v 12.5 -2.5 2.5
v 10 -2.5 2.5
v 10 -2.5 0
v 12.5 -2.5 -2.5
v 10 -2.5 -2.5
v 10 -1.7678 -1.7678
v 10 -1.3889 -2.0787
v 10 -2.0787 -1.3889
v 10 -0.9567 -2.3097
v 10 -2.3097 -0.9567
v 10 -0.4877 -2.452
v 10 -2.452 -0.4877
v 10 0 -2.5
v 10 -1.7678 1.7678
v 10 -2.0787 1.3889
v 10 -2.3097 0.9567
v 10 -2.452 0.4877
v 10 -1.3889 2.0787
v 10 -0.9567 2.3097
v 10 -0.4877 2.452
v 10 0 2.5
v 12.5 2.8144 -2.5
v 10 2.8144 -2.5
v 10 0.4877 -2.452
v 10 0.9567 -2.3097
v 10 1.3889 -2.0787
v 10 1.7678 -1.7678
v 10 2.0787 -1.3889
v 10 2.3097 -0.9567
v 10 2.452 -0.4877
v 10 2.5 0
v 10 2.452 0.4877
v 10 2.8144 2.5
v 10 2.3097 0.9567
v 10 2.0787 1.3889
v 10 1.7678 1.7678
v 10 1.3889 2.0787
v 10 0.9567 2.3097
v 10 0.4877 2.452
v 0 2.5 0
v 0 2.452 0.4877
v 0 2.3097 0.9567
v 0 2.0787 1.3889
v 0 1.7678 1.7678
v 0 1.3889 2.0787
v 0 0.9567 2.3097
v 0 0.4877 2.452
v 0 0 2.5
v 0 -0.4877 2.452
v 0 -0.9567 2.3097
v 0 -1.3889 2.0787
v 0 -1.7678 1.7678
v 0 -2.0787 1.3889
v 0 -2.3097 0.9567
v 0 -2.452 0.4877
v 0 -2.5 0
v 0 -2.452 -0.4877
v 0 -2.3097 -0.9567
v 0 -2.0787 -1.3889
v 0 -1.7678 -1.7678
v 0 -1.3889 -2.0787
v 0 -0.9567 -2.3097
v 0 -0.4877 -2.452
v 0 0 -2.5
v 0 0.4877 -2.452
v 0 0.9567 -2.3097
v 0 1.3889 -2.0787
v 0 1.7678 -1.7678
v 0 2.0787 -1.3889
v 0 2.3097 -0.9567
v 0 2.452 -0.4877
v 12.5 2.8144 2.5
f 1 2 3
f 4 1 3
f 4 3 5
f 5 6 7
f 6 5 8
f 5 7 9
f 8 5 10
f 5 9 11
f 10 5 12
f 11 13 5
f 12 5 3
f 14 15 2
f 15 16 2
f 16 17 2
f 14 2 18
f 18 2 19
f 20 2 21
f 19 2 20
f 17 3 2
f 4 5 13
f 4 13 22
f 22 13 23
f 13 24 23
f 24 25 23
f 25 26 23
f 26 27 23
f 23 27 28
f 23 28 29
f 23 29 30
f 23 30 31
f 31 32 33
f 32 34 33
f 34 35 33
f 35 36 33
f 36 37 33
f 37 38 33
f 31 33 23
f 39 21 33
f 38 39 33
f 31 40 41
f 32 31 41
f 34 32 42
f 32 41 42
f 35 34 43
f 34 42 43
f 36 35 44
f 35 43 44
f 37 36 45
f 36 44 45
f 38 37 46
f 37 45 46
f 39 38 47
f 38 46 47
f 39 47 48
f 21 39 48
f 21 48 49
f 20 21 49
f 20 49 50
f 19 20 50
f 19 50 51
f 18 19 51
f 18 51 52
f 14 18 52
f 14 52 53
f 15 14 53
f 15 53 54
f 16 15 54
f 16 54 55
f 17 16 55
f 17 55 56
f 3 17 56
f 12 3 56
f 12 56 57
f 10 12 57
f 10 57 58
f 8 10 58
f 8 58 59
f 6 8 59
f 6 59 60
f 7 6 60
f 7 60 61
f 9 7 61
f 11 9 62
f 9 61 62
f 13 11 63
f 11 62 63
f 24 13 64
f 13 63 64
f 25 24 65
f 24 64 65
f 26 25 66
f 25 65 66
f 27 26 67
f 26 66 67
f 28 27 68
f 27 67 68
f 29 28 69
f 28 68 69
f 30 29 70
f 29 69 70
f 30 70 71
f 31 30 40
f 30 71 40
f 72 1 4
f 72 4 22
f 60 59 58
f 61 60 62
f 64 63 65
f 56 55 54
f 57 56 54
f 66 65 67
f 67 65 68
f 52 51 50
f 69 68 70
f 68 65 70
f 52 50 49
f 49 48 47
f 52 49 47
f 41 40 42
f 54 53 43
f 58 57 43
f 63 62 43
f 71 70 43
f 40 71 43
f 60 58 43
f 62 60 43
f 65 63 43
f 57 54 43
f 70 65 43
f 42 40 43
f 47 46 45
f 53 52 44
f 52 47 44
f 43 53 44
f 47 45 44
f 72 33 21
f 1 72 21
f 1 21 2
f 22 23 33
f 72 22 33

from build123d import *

# Parameters (mm, degrees)
F0_R     = 2.5
F1_DEPTH = 10
F3_DEPTH = 2.5


with BuildPart() as f1:
    # F0 (on Right) → F1 (new body)
    with BuildSketch(Plane.YZ):
        Circle(F0_R)
    extrude(amount=F1_DEPTH)

    # F2 (on face) → F3 (join)
    with BuildSketch(Plane.YZ.offset(10)):
        with BuildLine():
            ThreePointArc((0, 2.5), (-1.767767, 1.767767), (-2.5, 0))
            ThreePointArc((-2.5, 0), (-1.767767, -1.767767), (0, -2.5))
            ThreePointArc((0, -2.5), (1.767767, -1.767767), (2.5, 0))
            ThreePointArc((2.5, 0), (1.767767, 1.767767), (0, 2.5))
        make_face()
        with BuildLine():
            Line((-2.5, 2.5), (-2.5, 0))
            ThreePointArc((-2.5, 0), (-1.767767, 1.767767), (0, 2.5))
            Line((0, 2.5), (-2.5, 2.5))
        make_face()
        with BuildLine():
            Line((2.814407, 2.5), (0, 2.5))
            ThreePointArc((0, 2.5), (1.767767, 1.767767), (2.5, 0))
            ThreePointArc((2.5, 0), (1.767767, -1.767767), (0, -2.5))
            Line((0, -2.5), (2.814407, -2.5))
            Line((2.814407, -2.5), (2.814407, 2.5))
        make_face()
        with BuildLine():
            ThreePointArc((0, -2.5), (-1.767767, -1.767767), (-2.5, 0))
            Line((-2.5, 0), (-2.5, -2.5))
            Line((-2.5, -2.5), (0, -2.5))
        make_face()
    extrude(amount=F3_DEPTH)


solid = f1.part
